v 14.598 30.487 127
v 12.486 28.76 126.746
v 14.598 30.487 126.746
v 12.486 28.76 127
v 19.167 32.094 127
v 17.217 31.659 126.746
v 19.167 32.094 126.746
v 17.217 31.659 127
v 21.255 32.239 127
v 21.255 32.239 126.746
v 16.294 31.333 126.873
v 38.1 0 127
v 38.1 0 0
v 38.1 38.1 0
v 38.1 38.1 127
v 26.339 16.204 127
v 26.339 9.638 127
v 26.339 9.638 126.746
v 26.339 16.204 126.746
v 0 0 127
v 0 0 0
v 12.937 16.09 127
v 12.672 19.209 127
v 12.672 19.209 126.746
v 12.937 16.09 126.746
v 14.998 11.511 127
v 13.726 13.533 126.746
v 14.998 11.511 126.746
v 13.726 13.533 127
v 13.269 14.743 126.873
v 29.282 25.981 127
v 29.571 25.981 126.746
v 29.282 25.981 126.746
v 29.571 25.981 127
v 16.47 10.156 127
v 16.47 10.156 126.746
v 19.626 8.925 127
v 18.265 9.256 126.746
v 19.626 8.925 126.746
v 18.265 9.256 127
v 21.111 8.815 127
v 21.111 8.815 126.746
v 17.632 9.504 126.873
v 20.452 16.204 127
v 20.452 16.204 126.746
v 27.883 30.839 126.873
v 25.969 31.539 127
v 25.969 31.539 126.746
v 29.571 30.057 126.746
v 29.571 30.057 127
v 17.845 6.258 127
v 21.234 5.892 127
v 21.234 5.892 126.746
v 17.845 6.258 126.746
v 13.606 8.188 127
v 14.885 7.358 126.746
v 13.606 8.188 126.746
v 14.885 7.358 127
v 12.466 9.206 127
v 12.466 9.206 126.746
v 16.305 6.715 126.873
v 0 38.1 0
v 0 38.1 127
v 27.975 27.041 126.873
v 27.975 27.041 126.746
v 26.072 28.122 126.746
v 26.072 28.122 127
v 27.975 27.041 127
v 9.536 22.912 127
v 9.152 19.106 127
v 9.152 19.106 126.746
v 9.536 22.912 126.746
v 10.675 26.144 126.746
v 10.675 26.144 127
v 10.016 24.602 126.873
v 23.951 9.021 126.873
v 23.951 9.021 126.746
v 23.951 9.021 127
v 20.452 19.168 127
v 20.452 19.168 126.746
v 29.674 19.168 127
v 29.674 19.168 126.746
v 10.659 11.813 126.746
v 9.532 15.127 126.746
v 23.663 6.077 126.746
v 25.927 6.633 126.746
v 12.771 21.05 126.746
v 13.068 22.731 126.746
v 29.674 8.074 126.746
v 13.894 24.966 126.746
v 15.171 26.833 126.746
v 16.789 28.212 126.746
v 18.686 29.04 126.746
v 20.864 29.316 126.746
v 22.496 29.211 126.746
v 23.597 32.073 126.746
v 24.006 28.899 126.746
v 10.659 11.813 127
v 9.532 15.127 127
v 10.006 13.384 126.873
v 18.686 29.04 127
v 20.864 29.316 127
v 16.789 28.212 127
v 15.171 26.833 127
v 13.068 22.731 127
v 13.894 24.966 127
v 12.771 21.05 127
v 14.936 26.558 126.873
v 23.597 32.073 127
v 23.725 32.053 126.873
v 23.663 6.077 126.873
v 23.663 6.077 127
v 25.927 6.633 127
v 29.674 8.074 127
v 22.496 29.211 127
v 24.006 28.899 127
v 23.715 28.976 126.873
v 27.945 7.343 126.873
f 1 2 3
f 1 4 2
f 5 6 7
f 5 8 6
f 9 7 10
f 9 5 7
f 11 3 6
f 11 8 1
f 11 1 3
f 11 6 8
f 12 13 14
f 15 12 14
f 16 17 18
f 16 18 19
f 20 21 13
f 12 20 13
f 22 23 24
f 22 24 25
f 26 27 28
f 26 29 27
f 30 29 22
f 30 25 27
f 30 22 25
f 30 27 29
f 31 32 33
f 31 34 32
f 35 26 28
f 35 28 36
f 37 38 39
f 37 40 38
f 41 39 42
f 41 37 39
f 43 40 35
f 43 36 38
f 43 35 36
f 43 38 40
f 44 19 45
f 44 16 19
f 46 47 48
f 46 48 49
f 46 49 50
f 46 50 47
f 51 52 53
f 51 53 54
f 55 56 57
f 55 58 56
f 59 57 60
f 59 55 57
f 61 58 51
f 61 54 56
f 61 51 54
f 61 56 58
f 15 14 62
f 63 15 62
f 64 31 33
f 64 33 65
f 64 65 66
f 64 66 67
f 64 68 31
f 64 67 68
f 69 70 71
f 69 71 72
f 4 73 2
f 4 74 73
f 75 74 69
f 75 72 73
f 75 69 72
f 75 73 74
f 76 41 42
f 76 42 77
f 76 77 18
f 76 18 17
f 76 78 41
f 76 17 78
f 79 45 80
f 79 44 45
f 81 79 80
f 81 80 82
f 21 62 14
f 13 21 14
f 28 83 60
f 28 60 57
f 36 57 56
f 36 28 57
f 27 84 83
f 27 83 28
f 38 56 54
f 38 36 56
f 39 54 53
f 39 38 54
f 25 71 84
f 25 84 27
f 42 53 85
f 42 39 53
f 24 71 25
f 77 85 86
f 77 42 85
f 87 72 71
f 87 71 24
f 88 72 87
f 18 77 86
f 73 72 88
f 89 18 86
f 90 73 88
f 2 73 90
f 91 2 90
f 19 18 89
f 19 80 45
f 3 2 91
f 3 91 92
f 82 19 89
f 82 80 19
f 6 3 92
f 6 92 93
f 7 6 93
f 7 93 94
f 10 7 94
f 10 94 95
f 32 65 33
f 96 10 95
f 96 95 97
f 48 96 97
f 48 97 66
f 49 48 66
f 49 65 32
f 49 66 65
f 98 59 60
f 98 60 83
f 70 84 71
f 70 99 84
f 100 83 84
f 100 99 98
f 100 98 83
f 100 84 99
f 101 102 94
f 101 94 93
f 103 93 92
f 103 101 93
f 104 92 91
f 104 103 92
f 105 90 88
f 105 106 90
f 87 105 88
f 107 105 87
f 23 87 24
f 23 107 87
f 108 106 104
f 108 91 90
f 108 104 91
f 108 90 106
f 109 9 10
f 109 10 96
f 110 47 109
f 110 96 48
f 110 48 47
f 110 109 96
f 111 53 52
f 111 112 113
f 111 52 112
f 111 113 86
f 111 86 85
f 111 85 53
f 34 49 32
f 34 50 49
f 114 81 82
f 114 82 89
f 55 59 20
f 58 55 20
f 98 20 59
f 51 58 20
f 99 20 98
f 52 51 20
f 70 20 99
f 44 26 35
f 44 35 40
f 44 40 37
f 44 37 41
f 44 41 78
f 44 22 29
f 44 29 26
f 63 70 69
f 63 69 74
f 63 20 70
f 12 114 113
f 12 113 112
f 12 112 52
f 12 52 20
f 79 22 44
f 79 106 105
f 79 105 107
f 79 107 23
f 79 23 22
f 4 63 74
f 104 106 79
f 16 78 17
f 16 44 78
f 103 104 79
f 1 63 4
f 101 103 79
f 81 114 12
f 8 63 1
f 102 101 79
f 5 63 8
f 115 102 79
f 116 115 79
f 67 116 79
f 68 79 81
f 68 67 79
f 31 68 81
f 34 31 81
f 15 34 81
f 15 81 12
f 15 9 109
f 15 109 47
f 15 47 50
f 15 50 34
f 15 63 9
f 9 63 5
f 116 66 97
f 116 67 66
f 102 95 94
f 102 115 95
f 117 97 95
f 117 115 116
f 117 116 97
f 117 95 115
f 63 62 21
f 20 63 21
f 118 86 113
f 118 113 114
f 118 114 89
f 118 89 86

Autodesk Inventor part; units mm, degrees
ref_plane "YZ Plane" through (0, 0, 0) normal (1, 0, 0) x (0, 1, 0)
ref_plane "XZ Plane" through (0, 0, 0) normal (0, 1, 0) x (-1, 0, 0)
ref_plane "XY Plane" through (0, 0, 0) normal (0, 0, 1) x (1, 0, 0)
sketch "Sketch1" plane through (0, 0, 0) normal (0, 0, 1) x (1, 0, 0)
  line L0 (0, 0) -> (38.1, 0)
  line L1 (38.1, 0) -> (38.1, 38.1)
  line L2 (38.1, 38.1) -> (0, 38.1)
  line L3 (0, 38.1) -> (0, 0)
  dimension "d0" = 38.1
  dimension "d1" = 38.1
extrude "Extrusion1" add sketch "Sketch1" along normal blind 127
sketch "Sketch2" plane through (0, 0, 127) normal (0, 0, 1) x (1, 0, 0)
  line L0 (8.0198, 32.2387) -> (54.4149, 32.2387) construction
  line L1 (54.4149, 32.2387) -> (54.4149, -0.3861) construction
  line L2 (54.4149, -0.3861) -> (8.0198, -0.3861) construction
  line L3 (8.0198, -0.3861) -> (8.0198, 32.2387) construction
  spline S0 degree 2 poles (21.2344, 5.8919) (18.5379, 5.8919) (14.0713, 7.5385) (12.4658, 9.2058) knots 0 0 0 1 2 2 2
  spline S1 degree 2 poles (12.4658, 9.2058) (10.8603, 10.8936) (9.1519, 15.8748) (9.1519, 19.1064) knots 0 0 0 1 2 2 2
  spline S2 degree 2 poles (9.1519, 19.1064) (9.1519, 22.1734) (10.8809, 27.0311) (12.4864, 28.7601) knots 0 0 0 1 2 2 2
  spline S3 degree 2 poles (12.4864, 28.7601) (14.0301, 30.4273) (18.5585, 32.2387) (21.2549, 32.2387) knots 0 0 0 1 2 2 2
  spline S4 degree 2 poles (21.2549, 32.2387) (22.5517, 32.2387) (24.8982, 31.8682) (25.9686, 31.5389) knots 0 0 0 1 2 2 2
  spline S5 degree 2 poles (25.9686, 31.5389) (26.8331, 31.2919) (28.9326, 30.3862) (29.5707, 30.0568) knots 0 0 0 1 2 2 2
  line L4 (29.5707, 30.0568) -> (29.5707, 25.9813)
  line L5 (29.5707, 25.9813) -> (29.2825, 25.9813)
  spline S6 degree 2 poles (29.2825, 25.9813) (28.6444, 26.5371) (27.3065, 27.5457) (26.0715, 28.122) knots 0 0 0 1 2 2 2
  spline S7 degree 2 poles (26.0715, 28.122) (25.0423, 28.6366) (22.387, 29.3158) (20.8639, 29.3158) knots 0 0 0 1 2 2 2
  spline S8 degree 2 poles (20.8639, 29.3158) (17.2, 29.3158) (12.6716, 23.7995) (12.6716, 19.2094) knots 0 0 0 1 2 2 2
  spline S9 degree 2 poles (12.6716, 19.2094) (12.6716, 16.657) (13.8655, 12.8285) (14.9976, 11.5111) knots 0 0 0 1 2 2 2
  spline S10 degree 2 poles (14.9976, 11.5111) (16.0885, 10.1938) (19.176, 8.8147) (21.1109, 8.8147) knots 0 0 0 1 2 2 2
  spline S11 degree 2 poles (21.1109, 8.8147) (22.5311, 8.8147) (25.3716, 9.2264) (26.3391, 9.638) knots 0 0 0 1 2 2 2
  line L6 (26.3391, 9.638) -> (26.3391, 16.2042)
  line L7 (26.3391, 16.2042) -> (20.4522, 16.2042)
  line L8 (20.4522, 16.2042) -> (20.4522, 19.1682)
  line L9 (20.4522, 19.1682) -> (29.6736, 19.1682)
  line L10 (29.6736, 19.1682) -> (29.6736, 8.0737)
  spline S12 degree 2 poles (29.6736, 8.0737) (29.0355, 7.7855) (26.8536, 6.9004) (25.9274, 6.6329) knots 0 0 0 1 2 2 2
  spline S13 degree 2 poles (25.9274, 6.6329) (24.6718, 6.2624) (22.6546, 5.8919) (21.2344, 5.8919) knots 0 0 0 1 2 2 2
  point P0 (0, 0)
extrude "Extrusion3" cut sketch "Sketch2" against normal blind 0.254
equation "\"d1\" = d0"
properties part number "Container 2 2 5 generic"
